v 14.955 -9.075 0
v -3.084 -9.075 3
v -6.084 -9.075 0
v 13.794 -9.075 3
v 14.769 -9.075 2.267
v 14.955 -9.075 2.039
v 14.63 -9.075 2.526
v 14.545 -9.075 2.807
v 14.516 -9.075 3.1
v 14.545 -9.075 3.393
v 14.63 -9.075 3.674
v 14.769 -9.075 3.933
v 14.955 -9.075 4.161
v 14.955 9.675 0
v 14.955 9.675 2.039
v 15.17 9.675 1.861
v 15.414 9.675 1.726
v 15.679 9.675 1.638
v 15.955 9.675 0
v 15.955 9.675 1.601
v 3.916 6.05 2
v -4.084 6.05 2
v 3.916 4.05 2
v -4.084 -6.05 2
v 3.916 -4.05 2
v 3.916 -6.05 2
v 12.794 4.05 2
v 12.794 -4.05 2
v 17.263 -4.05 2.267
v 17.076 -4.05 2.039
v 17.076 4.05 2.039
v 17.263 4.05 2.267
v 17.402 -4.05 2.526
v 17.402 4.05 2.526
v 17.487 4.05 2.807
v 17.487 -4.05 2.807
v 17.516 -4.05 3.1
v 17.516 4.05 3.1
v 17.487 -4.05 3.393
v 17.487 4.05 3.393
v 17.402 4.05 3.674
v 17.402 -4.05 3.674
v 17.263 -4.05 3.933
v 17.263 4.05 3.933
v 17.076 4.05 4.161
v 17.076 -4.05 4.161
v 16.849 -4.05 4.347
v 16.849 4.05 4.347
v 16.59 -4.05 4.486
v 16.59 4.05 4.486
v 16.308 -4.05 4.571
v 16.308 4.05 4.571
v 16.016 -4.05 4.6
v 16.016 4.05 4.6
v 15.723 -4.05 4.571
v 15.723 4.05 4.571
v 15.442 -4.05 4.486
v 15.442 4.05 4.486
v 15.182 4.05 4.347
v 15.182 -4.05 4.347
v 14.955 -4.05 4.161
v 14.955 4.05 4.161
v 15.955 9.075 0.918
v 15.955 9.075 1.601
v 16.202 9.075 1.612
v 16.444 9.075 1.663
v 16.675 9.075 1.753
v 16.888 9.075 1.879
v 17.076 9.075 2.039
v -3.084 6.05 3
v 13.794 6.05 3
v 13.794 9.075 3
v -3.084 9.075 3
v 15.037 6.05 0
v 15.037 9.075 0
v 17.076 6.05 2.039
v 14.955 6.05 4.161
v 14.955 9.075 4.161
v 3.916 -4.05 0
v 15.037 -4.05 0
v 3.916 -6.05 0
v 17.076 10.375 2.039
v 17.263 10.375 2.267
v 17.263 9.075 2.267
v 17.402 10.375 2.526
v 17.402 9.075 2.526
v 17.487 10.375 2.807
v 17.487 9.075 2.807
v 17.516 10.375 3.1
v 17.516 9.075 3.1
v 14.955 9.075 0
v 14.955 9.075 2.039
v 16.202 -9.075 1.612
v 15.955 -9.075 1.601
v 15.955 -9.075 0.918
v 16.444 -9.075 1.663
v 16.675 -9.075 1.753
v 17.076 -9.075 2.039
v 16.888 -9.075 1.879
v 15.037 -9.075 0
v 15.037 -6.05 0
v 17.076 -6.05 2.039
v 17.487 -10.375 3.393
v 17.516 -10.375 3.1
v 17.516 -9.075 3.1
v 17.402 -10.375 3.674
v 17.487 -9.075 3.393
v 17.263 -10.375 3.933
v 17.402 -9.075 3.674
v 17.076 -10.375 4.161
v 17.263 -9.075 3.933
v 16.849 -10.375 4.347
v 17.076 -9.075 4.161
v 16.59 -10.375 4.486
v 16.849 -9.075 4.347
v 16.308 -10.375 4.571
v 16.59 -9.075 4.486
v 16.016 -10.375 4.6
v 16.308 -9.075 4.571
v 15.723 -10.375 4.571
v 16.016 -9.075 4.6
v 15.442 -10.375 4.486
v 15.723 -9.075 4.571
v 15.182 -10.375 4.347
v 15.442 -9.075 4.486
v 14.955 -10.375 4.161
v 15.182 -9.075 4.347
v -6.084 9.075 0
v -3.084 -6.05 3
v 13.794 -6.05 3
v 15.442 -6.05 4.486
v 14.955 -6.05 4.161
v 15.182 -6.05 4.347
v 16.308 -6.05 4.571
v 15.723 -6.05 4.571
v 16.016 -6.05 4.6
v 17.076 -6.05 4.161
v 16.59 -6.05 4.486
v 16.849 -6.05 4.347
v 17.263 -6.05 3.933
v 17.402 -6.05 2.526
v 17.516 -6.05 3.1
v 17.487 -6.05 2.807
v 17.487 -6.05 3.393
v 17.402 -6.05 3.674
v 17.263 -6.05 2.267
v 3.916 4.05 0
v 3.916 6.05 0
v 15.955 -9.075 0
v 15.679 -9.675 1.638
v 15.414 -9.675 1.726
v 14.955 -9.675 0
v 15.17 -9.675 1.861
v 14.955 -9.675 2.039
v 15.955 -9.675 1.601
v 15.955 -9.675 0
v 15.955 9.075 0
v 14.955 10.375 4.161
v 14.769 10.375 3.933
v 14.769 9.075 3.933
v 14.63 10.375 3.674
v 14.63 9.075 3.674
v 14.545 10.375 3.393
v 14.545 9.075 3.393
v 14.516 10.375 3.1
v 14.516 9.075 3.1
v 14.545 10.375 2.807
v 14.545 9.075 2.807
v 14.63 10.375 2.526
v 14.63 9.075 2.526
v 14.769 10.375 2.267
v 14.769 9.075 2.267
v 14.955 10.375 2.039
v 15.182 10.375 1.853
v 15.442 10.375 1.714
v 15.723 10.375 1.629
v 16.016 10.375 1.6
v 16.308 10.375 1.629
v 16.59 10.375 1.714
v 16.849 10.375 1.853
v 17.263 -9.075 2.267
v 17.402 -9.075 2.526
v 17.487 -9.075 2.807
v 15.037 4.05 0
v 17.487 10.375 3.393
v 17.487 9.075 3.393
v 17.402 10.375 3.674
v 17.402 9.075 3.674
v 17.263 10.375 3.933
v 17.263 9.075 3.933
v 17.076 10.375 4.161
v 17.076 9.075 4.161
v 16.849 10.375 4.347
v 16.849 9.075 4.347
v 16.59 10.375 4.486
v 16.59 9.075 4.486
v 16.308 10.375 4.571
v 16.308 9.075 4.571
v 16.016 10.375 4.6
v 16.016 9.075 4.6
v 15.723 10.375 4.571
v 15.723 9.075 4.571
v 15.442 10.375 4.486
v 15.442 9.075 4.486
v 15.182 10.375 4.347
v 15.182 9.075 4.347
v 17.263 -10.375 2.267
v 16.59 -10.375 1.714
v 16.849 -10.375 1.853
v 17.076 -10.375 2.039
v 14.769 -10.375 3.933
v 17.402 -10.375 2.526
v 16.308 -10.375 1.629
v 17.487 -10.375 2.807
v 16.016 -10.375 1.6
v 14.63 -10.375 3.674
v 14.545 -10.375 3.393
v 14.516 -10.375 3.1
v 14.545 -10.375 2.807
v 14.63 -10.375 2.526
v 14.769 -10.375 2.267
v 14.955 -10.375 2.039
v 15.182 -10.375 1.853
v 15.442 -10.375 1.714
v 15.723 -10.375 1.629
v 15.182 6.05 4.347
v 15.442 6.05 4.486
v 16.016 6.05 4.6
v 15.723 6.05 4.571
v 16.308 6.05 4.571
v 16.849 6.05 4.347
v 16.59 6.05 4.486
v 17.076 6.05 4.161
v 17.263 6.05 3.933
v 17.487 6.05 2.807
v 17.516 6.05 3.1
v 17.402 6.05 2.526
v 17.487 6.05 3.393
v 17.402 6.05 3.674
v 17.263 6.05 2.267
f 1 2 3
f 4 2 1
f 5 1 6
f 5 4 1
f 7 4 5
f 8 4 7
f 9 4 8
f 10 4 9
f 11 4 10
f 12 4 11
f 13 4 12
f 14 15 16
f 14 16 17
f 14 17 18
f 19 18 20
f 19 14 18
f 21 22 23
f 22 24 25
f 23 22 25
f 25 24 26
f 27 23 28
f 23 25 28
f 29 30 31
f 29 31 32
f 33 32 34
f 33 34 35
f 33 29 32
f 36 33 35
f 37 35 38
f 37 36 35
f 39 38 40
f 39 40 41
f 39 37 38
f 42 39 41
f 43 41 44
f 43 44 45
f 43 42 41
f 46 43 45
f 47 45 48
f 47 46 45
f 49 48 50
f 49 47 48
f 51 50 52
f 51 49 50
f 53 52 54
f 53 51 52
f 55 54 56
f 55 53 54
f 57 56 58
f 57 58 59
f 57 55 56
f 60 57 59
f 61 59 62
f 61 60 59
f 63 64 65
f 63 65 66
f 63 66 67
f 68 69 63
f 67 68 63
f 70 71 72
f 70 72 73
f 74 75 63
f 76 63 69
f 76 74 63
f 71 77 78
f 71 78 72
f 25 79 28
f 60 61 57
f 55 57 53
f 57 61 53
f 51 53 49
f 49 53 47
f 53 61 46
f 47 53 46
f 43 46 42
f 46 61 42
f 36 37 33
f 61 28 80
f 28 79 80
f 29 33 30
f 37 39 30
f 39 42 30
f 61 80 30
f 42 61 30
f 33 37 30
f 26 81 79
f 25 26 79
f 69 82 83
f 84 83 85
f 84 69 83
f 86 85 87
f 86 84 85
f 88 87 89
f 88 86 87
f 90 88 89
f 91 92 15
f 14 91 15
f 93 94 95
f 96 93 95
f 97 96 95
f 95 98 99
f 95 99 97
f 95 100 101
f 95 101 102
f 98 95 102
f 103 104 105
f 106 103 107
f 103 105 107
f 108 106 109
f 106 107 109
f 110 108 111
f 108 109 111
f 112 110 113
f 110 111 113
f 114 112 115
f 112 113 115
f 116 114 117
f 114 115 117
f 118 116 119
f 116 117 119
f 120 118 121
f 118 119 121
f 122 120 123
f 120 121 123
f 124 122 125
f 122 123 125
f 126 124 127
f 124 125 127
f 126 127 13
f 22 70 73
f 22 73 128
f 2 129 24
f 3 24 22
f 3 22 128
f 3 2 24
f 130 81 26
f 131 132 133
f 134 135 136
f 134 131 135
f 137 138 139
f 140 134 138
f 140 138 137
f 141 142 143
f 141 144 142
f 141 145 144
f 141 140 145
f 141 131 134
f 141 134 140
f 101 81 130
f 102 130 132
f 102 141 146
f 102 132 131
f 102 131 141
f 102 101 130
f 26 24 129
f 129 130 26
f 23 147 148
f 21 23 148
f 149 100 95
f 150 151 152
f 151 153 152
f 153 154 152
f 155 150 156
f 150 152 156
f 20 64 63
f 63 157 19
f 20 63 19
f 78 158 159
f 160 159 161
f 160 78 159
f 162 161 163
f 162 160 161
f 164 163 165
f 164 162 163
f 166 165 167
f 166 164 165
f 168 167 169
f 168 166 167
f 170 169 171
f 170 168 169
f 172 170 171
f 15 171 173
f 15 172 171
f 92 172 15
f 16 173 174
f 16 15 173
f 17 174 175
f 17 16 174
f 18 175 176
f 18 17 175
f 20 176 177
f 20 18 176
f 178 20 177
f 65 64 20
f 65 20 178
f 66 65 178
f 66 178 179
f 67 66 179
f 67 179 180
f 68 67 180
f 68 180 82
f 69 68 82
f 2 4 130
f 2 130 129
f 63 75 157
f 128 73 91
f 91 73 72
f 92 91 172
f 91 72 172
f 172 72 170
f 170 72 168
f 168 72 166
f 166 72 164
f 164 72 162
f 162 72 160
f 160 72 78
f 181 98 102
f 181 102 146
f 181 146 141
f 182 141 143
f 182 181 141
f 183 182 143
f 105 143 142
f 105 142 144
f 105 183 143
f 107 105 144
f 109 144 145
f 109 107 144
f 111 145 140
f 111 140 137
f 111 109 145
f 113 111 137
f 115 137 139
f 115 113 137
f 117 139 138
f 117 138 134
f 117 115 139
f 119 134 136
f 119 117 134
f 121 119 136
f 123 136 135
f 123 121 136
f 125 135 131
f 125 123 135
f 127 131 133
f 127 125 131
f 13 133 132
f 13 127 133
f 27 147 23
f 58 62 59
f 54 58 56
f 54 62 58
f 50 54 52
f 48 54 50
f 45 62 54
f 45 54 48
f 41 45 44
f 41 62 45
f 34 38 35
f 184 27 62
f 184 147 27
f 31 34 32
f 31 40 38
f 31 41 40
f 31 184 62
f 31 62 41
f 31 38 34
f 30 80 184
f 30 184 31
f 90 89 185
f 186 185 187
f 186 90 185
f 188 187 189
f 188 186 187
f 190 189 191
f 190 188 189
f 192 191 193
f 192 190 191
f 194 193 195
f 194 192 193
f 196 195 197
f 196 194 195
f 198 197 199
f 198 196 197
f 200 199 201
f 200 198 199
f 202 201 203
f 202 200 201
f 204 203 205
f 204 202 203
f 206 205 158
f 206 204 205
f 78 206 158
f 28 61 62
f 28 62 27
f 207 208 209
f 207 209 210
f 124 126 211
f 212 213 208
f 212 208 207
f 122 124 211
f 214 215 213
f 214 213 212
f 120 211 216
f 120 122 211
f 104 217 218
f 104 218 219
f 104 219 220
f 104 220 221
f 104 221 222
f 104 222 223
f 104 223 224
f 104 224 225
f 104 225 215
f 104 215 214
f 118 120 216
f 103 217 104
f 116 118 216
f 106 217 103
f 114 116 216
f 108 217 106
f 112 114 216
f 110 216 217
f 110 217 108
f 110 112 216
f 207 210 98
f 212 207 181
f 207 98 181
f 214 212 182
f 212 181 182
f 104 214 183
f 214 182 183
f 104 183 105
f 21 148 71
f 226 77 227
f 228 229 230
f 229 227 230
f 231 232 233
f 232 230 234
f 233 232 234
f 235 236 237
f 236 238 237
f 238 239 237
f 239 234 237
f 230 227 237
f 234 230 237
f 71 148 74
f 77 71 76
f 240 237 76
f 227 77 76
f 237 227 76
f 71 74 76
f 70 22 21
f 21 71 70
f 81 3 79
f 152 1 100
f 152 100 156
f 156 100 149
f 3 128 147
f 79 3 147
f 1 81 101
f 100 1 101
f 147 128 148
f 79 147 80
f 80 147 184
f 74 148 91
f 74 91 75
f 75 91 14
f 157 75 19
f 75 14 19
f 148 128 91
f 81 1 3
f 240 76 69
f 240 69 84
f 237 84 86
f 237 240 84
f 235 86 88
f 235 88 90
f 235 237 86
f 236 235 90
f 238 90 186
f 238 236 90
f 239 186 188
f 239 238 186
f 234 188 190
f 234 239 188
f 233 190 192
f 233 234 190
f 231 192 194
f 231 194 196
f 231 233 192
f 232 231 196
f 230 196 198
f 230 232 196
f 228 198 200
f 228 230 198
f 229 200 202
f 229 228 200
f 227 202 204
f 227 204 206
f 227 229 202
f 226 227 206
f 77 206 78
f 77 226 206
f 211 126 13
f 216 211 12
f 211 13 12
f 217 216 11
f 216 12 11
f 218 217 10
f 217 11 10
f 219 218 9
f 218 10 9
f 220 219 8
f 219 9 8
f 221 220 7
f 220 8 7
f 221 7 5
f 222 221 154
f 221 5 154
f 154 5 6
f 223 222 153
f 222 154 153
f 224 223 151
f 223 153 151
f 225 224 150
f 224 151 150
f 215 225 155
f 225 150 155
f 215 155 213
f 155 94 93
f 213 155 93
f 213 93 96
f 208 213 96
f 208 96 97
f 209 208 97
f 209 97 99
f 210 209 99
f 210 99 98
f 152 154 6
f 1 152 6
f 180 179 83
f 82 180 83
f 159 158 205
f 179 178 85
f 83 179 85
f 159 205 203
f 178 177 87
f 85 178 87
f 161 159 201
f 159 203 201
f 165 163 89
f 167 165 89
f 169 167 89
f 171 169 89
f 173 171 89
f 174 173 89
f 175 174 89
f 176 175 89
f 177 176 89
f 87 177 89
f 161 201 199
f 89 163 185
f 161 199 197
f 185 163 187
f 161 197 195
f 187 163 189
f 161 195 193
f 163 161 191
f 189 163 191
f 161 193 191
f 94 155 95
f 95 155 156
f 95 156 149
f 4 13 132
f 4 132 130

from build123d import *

# Parameters (mm, degrees)
F1_DEPTH  = 9.075
F3_DEPTH  = 1.3
F6_DEPTH  = 6.05
F7_W      = 15
F7_H      = 2
F8_DEPTH  = 4.601
F9_W      = 1
F9_H      = 0.6
F10_DEPTH = 3


with BuildPart() as f1:
    # F0 (on Front) → F1 (new body, symmetric)
    with BuildSketch(Plane.XZ):
        with BuildLine():
            Line((-3.0842823463, 3), (-6.0842823463, 0))
            Line((-6.0842823463, 0), (15.0370379973, 0))
            Line((15.0370379973, 0), (17.0763778255, 2.0393398282))
            ThreePointArc((17.0763778255, 2.0393398282), (17.0763778255, 4.1606601718), (14.9550574819, 4.1606601718))
            Line((14.9550574819, 4.1606601718), (13.7943973101, 3))
            Line((13.7943973101, 3), (-3.0842823463, 3))
        make_face()
    extrude(amount=F1_DEPTH, both=True)

    # F2 (on face) → F3 (join)
    with BuildSketch(Plane.XZ.offset(9.075)):
        with BuildLine():
            ThreePointArc((17.0763778255, 2.0393398282), (17.4015369525, 2.5259748515), (17.5157176537, 3.1))
            ThreePointArc((17.5157176537, 3.1), (16.5897428022, 4.4858192988), (14.9550574819, 4.1606601718))
            ThreePointArc((14.9550574819, 4.1606601718), (14.9550574819, 2.0393398282), (17.0763778255, 2.0393398282))
        make_face()
    extrude(amount=F3_DEPTH)

    # F4: F1 across plane


with BuildPart() as f1_1:
    add(f1.part)
    add(f1.part.mirror(Plane.XZ))

    # F5 (on Front) → F6 (cut, symmetric)
    with BuildSketch(Plane.XZ):
        Polygon((12.7943973101, 2), (13.7943973101, 3), (-3.0842823463, 3), (-4.0842823463, 2), align=None)
    extrude(amount=F6_DEPTH, both=True, mode=Mode.SUBTRACT)

    # F7 (on Top) → F8 (cut, through all)
    with BuildSketch(Plane.XY):
        with Locations((11.4157176537, -5.05)):
            Rectangle(F7_W, F7_H)
        with Locations((11.4157176537, 5.05)):
            Rectangle(F7_W, F7_H)
    extrude(amount=F8_DEPTH, mode=Mode.SUBTRACT)

    # F9 (on Top) → F10 (join)
    with BuildSketch(Plane.XY):
        with Locations((15.4550574819, 9.375)):
            Rectangle(F9_W, F9_H)
        with Locations((15.4550574819, -9.375)):
            Rectangle(F9_W, F9_H)
    extrude(amount=F10_DEPTH)


solid = f1_1.part
